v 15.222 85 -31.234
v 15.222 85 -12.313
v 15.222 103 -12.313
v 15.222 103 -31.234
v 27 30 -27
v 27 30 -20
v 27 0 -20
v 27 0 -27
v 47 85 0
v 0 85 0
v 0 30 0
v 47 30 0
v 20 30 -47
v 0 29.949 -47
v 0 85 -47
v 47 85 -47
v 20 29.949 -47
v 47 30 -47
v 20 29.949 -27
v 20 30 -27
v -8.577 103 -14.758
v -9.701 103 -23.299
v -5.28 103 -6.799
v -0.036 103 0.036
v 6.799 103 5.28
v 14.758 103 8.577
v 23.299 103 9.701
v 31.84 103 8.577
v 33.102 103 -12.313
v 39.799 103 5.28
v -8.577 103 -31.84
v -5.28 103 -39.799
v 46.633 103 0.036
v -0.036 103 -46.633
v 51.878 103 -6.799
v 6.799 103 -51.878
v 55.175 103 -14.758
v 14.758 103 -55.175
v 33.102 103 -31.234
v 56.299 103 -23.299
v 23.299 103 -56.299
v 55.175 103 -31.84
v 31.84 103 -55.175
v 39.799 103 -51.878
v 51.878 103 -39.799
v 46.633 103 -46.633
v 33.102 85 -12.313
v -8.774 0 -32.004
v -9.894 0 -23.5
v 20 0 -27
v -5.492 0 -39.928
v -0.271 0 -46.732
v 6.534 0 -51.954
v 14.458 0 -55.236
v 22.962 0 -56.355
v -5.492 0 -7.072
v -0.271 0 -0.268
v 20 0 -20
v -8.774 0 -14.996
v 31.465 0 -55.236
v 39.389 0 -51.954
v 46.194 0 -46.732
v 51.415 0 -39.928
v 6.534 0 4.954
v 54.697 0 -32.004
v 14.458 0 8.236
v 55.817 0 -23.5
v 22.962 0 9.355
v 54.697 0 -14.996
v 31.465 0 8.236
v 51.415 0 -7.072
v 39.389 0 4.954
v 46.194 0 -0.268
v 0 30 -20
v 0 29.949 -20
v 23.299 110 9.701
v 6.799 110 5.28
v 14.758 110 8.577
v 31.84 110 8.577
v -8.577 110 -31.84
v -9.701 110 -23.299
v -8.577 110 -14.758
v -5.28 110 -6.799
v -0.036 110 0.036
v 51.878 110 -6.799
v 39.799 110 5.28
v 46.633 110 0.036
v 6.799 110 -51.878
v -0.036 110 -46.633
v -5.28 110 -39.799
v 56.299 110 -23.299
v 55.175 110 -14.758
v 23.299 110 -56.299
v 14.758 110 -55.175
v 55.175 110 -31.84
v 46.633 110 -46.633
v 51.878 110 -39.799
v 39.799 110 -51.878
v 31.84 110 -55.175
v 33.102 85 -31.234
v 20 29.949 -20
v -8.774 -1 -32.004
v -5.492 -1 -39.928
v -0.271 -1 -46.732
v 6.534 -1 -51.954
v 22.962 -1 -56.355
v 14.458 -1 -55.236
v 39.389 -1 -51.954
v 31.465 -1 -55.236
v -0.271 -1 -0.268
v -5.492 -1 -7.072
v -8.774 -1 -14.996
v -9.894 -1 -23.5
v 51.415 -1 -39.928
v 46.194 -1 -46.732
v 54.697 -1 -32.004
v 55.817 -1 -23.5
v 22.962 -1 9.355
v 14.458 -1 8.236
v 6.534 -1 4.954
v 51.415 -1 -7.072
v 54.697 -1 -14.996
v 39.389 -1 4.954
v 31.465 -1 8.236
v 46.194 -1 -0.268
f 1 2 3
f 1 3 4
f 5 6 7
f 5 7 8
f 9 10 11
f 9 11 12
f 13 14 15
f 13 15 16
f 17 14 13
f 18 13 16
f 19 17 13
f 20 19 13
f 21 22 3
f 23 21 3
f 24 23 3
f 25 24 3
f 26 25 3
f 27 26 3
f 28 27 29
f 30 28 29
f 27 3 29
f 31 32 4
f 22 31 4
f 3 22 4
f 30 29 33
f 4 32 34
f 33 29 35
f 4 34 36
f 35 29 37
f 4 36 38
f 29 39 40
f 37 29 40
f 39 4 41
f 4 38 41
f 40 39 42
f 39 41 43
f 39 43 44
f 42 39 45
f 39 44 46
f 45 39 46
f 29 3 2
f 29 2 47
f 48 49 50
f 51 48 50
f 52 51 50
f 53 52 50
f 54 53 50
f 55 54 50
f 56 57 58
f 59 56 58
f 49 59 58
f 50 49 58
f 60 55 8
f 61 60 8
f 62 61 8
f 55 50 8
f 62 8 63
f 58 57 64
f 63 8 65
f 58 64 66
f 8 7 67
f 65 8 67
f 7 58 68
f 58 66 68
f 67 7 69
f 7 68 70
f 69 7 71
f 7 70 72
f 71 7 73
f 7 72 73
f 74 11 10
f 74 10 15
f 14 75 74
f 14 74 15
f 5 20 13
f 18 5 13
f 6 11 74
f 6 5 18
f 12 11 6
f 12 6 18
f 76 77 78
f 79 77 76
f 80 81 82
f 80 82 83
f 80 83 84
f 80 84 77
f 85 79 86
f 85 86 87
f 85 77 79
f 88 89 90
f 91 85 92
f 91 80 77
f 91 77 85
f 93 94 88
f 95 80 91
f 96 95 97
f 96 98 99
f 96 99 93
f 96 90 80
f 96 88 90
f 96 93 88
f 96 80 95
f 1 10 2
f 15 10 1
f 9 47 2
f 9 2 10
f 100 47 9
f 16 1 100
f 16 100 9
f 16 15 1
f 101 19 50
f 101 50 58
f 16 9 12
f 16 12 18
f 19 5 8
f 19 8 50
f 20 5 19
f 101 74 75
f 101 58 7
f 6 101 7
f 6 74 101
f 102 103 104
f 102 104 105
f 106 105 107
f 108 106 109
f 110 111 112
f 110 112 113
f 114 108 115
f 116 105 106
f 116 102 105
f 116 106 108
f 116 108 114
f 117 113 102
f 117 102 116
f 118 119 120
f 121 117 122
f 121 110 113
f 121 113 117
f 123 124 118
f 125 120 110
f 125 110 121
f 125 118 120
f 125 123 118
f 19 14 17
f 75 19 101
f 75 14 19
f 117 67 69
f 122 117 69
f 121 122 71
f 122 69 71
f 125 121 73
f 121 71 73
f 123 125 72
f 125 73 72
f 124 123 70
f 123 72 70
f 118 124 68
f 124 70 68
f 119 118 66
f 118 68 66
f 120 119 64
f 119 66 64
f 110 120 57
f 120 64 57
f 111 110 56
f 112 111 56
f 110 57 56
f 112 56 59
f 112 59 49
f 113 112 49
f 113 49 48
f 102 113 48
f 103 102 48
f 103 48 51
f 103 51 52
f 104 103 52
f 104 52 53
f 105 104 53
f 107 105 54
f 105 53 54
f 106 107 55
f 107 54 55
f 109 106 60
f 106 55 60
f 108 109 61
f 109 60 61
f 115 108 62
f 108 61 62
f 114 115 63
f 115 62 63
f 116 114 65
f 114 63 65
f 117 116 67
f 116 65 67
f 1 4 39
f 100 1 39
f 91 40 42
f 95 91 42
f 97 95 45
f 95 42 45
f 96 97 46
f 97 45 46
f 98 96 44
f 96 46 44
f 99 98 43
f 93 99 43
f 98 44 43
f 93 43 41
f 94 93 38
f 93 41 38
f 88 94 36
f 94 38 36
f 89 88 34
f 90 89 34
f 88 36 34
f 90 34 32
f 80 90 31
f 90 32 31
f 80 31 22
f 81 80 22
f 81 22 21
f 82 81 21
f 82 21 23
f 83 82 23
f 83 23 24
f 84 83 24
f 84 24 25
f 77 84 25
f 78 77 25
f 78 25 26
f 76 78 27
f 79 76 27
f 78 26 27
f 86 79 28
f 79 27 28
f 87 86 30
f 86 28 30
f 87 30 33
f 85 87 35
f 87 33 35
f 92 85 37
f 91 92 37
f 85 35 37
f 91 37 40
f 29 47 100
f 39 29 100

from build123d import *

# Parameters (mm, degrees)
SKETCH1_W           = 47
SKETCH1_H           = 47
BOSS_EXTRUDE1_DEPTH = 85
SKETCH2_W           = 47
SKETCH2_H           = 30
CUT_EXTRUDE1_DEPTH  = 20
SKETCH3_W           = 27
SKETCH3_H           = 29.949158553
CUT_EXTRUDE2_DEPTH  = 20
SKETCH4_W           = 27
SKETCH4_H           = 30
CUT_EXTRUDE3_DEPTH  = 20
SKETCH5_W           = 7
SKETCH5_H           = 30
CUT_EXTRUDE4_DEPTH  = 20
SKETCH6_W           = 17.880231582
SKETCH6_H           = 18.920879981
BOSS_EXTRUDE2_DEPTH = 18
SKETCH7_R           = 33
BOSS_EXTRUDE4_DEPTH = 7
SKETCH9_R           = 32.855450218
BOSS_EXTRUDE5_DEPTH = 1


with BuildPart() as part:
    # Sketch1 → Boss-Extrude1 (new body)
    with BuildSketch(Plane(origin=(0, 0, 0), x_dir=(1, 0, 0), z_dir=(0, 1, 0))):
        with Locations((23.5, 23.5)):
            Rectangle(SKETCH1_W, SKETCH1_H)
    extrude(amount=BOSS_EXTRUDE1_DEPTH)

    # Sketch2 → Cut-Extrude1 (cut)
    with BuildSketch(Plane.XY):
        with Locations((23.5, 15)):
            Rectangle(SKETCH2_W, SKETCH2_H)
    extrude(amount=-CUT_EXTRUDE1_DEPTH, mode=Mode.SUBTRACT)

    # Sketch3 → Cut-Extrude2 (cut)
    with BuildSketch(Plane.ZY):
        with Locations((-33.5, 14.974579277)):
            Rectangle(SKETCH3_W, SKETCH3_H)
    extrude(amount=-CUT_EXTRUDE2_DEPTH, mode=Mode.SUBTRACT)

    # Sketch4 → Cut-Extrude3 (cut)
    with BuildSketch(Plane(origin=(0, 0, -47), x_dir=(-1, 0, 0), z_dir=(0, 0, -1))):
        with Locations((-33.5, 15)):
            Rectangle(SKETCH4_W, SKETCH4_H)
    extrude(amount=-CUT_EXTRUDE3_DEPTH, mode=Mode.SUBTRACT)

    # Sketch5 → Cut-Extrude4 (cut)
    with BuildSketch(Plane(origin=(47, 0, 0), x_dir=(0, 0, -1), z_dir=(1, 0, 0))):
        with Locations((23.5, 15)):
            Rectangle(SKETCH5_W, SKETCH5_H)
    extrude(amount=-CUT_EXTRUDE4_DEPTH, mode=Mode.SUBTRACT)

    # Sketch6 → Boss-Extrude2 (add)
    with BuildSketch(Plane(origin=(0, 85, 0), x_dir=(1, 0, 0), z_dir=(0, 1, 0))):
        with Locations((24.162230799, 21.773469702)):
            Rectangle(SKETCH6_W, SKETCH6_H)
    extrude(amount=BOSS_EXTRUDE2_DEPTH)

    # Sketch7 → Boss-Extrude4 (add)
    with BuildSketch(Plane(origin=(0, 103, 0), x_dir=(1, 0, 0), z_dir=(0, 1, 0))):
        with Locations((23.29896565, 23.29896565)):
            Circle(SKETCH7_R)
    extrude(amount=BOSS_EXTRUDE4_DEPTH)

    # Sketch9 → Boss-Extrude5 (add)
    with BuildSketch(Plane.XZ):
        with Locations((22.961502761, -23.5)):
            Circle(SKETCH9_R)
    extrude(amount=BOSS_EXTRUDE5_DEPTH)


solid = part.part
